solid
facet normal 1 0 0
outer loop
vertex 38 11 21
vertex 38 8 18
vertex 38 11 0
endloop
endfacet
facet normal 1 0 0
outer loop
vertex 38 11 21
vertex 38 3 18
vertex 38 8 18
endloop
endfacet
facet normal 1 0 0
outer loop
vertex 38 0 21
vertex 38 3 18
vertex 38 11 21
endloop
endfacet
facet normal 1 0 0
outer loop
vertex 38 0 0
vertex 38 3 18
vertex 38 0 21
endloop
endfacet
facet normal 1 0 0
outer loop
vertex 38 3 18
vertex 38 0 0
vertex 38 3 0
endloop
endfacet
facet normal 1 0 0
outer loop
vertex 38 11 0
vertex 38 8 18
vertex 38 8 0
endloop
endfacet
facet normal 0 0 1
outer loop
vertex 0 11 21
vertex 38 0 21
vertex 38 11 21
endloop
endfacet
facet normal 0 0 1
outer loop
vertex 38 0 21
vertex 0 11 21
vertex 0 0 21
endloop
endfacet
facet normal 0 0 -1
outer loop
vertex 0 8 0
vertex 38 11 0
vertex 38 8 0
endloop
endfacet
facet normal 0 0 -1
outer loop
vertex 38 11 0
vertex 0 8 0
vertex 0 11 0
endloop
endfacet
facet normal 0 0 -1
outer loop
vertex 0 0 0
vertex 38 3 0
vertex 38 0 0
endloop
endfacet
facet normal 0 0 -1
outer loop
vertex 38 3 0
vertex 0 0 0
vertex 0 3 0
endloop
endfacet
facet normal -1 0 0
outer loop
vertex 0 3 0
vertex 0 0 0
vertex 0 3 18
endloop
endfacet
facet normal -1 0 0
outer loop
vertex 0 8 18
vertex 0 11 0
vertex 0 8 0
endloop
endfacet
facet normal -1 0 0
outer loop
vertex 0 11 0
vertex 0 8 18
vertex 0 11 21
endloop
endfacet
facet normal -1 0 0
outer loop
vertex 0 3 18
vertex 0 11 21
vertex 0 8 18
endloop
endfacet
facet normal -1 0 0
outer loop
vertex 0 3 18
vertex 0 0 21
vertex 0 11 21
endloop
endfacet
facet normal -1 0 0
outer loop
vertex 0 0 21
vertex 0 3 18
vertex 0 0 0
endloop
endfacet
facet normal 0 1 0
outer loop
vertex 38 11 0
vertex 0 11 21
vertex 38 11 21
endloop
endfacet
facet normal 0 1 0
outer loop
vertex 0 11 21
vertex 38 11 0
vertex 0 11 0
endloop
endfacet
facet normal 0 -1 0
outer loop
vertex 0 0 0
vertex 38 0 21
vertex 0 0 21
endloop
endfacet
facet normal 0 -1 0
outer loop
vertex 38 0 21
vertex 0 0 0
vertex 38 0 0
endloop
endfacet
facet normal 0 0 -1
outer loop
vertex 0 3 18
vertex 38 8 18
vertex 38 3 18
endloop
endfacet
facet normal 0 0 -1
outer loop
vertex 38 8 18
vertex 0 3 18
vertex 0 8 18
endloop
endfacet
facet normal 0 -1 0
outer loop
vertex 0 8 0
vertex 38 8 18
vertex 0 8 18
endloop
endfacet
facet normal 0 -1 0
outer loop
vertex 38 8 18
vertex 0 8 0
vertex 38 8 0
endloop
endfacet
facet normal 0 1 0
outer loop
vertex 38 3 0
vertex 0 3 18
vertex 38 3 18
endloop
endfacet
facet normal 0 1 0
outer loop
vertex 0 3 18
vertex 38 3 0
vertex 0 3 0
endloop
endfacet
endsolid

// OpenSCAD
/* "I" Panel connector generator by Llorenç Garcia 16/10/2024, https://github.com/Siot/designs
 *
 * Licensing: 
 * This user content is licensed under a
Creative Commons Attribution-Noncommercial-Share Alike (https://creativecommons.org/licenses/by-nc-sa/4.0/)
*/

innerDuctWidth = 5;
wallThickness = 3;
innerWallHeight = 18;
length = 38;
useOuterArmLengthInsteadOfLength=false;
outerArmLength = 13.5;

/* [Hidden] */
fullLength = useOuterArmLengthInsteadOfLength ? outerArmLength+wallThickness+innerDuctWidth+wallThickness+outerArmLength : length;
fullHeight = innerWallHeight + wallThickness;

echo(fullLength);

difference() {
    
    cube([fullLength,wallThickness + innerDuctWidth + wallThickness, fullHeight]);

    union() {
        translate([-1, wallThickness, -1]) {
            cube([fullLength+2,innerDuctWidth,innerWallHeight+1]);
        }
        
    }
    

}
